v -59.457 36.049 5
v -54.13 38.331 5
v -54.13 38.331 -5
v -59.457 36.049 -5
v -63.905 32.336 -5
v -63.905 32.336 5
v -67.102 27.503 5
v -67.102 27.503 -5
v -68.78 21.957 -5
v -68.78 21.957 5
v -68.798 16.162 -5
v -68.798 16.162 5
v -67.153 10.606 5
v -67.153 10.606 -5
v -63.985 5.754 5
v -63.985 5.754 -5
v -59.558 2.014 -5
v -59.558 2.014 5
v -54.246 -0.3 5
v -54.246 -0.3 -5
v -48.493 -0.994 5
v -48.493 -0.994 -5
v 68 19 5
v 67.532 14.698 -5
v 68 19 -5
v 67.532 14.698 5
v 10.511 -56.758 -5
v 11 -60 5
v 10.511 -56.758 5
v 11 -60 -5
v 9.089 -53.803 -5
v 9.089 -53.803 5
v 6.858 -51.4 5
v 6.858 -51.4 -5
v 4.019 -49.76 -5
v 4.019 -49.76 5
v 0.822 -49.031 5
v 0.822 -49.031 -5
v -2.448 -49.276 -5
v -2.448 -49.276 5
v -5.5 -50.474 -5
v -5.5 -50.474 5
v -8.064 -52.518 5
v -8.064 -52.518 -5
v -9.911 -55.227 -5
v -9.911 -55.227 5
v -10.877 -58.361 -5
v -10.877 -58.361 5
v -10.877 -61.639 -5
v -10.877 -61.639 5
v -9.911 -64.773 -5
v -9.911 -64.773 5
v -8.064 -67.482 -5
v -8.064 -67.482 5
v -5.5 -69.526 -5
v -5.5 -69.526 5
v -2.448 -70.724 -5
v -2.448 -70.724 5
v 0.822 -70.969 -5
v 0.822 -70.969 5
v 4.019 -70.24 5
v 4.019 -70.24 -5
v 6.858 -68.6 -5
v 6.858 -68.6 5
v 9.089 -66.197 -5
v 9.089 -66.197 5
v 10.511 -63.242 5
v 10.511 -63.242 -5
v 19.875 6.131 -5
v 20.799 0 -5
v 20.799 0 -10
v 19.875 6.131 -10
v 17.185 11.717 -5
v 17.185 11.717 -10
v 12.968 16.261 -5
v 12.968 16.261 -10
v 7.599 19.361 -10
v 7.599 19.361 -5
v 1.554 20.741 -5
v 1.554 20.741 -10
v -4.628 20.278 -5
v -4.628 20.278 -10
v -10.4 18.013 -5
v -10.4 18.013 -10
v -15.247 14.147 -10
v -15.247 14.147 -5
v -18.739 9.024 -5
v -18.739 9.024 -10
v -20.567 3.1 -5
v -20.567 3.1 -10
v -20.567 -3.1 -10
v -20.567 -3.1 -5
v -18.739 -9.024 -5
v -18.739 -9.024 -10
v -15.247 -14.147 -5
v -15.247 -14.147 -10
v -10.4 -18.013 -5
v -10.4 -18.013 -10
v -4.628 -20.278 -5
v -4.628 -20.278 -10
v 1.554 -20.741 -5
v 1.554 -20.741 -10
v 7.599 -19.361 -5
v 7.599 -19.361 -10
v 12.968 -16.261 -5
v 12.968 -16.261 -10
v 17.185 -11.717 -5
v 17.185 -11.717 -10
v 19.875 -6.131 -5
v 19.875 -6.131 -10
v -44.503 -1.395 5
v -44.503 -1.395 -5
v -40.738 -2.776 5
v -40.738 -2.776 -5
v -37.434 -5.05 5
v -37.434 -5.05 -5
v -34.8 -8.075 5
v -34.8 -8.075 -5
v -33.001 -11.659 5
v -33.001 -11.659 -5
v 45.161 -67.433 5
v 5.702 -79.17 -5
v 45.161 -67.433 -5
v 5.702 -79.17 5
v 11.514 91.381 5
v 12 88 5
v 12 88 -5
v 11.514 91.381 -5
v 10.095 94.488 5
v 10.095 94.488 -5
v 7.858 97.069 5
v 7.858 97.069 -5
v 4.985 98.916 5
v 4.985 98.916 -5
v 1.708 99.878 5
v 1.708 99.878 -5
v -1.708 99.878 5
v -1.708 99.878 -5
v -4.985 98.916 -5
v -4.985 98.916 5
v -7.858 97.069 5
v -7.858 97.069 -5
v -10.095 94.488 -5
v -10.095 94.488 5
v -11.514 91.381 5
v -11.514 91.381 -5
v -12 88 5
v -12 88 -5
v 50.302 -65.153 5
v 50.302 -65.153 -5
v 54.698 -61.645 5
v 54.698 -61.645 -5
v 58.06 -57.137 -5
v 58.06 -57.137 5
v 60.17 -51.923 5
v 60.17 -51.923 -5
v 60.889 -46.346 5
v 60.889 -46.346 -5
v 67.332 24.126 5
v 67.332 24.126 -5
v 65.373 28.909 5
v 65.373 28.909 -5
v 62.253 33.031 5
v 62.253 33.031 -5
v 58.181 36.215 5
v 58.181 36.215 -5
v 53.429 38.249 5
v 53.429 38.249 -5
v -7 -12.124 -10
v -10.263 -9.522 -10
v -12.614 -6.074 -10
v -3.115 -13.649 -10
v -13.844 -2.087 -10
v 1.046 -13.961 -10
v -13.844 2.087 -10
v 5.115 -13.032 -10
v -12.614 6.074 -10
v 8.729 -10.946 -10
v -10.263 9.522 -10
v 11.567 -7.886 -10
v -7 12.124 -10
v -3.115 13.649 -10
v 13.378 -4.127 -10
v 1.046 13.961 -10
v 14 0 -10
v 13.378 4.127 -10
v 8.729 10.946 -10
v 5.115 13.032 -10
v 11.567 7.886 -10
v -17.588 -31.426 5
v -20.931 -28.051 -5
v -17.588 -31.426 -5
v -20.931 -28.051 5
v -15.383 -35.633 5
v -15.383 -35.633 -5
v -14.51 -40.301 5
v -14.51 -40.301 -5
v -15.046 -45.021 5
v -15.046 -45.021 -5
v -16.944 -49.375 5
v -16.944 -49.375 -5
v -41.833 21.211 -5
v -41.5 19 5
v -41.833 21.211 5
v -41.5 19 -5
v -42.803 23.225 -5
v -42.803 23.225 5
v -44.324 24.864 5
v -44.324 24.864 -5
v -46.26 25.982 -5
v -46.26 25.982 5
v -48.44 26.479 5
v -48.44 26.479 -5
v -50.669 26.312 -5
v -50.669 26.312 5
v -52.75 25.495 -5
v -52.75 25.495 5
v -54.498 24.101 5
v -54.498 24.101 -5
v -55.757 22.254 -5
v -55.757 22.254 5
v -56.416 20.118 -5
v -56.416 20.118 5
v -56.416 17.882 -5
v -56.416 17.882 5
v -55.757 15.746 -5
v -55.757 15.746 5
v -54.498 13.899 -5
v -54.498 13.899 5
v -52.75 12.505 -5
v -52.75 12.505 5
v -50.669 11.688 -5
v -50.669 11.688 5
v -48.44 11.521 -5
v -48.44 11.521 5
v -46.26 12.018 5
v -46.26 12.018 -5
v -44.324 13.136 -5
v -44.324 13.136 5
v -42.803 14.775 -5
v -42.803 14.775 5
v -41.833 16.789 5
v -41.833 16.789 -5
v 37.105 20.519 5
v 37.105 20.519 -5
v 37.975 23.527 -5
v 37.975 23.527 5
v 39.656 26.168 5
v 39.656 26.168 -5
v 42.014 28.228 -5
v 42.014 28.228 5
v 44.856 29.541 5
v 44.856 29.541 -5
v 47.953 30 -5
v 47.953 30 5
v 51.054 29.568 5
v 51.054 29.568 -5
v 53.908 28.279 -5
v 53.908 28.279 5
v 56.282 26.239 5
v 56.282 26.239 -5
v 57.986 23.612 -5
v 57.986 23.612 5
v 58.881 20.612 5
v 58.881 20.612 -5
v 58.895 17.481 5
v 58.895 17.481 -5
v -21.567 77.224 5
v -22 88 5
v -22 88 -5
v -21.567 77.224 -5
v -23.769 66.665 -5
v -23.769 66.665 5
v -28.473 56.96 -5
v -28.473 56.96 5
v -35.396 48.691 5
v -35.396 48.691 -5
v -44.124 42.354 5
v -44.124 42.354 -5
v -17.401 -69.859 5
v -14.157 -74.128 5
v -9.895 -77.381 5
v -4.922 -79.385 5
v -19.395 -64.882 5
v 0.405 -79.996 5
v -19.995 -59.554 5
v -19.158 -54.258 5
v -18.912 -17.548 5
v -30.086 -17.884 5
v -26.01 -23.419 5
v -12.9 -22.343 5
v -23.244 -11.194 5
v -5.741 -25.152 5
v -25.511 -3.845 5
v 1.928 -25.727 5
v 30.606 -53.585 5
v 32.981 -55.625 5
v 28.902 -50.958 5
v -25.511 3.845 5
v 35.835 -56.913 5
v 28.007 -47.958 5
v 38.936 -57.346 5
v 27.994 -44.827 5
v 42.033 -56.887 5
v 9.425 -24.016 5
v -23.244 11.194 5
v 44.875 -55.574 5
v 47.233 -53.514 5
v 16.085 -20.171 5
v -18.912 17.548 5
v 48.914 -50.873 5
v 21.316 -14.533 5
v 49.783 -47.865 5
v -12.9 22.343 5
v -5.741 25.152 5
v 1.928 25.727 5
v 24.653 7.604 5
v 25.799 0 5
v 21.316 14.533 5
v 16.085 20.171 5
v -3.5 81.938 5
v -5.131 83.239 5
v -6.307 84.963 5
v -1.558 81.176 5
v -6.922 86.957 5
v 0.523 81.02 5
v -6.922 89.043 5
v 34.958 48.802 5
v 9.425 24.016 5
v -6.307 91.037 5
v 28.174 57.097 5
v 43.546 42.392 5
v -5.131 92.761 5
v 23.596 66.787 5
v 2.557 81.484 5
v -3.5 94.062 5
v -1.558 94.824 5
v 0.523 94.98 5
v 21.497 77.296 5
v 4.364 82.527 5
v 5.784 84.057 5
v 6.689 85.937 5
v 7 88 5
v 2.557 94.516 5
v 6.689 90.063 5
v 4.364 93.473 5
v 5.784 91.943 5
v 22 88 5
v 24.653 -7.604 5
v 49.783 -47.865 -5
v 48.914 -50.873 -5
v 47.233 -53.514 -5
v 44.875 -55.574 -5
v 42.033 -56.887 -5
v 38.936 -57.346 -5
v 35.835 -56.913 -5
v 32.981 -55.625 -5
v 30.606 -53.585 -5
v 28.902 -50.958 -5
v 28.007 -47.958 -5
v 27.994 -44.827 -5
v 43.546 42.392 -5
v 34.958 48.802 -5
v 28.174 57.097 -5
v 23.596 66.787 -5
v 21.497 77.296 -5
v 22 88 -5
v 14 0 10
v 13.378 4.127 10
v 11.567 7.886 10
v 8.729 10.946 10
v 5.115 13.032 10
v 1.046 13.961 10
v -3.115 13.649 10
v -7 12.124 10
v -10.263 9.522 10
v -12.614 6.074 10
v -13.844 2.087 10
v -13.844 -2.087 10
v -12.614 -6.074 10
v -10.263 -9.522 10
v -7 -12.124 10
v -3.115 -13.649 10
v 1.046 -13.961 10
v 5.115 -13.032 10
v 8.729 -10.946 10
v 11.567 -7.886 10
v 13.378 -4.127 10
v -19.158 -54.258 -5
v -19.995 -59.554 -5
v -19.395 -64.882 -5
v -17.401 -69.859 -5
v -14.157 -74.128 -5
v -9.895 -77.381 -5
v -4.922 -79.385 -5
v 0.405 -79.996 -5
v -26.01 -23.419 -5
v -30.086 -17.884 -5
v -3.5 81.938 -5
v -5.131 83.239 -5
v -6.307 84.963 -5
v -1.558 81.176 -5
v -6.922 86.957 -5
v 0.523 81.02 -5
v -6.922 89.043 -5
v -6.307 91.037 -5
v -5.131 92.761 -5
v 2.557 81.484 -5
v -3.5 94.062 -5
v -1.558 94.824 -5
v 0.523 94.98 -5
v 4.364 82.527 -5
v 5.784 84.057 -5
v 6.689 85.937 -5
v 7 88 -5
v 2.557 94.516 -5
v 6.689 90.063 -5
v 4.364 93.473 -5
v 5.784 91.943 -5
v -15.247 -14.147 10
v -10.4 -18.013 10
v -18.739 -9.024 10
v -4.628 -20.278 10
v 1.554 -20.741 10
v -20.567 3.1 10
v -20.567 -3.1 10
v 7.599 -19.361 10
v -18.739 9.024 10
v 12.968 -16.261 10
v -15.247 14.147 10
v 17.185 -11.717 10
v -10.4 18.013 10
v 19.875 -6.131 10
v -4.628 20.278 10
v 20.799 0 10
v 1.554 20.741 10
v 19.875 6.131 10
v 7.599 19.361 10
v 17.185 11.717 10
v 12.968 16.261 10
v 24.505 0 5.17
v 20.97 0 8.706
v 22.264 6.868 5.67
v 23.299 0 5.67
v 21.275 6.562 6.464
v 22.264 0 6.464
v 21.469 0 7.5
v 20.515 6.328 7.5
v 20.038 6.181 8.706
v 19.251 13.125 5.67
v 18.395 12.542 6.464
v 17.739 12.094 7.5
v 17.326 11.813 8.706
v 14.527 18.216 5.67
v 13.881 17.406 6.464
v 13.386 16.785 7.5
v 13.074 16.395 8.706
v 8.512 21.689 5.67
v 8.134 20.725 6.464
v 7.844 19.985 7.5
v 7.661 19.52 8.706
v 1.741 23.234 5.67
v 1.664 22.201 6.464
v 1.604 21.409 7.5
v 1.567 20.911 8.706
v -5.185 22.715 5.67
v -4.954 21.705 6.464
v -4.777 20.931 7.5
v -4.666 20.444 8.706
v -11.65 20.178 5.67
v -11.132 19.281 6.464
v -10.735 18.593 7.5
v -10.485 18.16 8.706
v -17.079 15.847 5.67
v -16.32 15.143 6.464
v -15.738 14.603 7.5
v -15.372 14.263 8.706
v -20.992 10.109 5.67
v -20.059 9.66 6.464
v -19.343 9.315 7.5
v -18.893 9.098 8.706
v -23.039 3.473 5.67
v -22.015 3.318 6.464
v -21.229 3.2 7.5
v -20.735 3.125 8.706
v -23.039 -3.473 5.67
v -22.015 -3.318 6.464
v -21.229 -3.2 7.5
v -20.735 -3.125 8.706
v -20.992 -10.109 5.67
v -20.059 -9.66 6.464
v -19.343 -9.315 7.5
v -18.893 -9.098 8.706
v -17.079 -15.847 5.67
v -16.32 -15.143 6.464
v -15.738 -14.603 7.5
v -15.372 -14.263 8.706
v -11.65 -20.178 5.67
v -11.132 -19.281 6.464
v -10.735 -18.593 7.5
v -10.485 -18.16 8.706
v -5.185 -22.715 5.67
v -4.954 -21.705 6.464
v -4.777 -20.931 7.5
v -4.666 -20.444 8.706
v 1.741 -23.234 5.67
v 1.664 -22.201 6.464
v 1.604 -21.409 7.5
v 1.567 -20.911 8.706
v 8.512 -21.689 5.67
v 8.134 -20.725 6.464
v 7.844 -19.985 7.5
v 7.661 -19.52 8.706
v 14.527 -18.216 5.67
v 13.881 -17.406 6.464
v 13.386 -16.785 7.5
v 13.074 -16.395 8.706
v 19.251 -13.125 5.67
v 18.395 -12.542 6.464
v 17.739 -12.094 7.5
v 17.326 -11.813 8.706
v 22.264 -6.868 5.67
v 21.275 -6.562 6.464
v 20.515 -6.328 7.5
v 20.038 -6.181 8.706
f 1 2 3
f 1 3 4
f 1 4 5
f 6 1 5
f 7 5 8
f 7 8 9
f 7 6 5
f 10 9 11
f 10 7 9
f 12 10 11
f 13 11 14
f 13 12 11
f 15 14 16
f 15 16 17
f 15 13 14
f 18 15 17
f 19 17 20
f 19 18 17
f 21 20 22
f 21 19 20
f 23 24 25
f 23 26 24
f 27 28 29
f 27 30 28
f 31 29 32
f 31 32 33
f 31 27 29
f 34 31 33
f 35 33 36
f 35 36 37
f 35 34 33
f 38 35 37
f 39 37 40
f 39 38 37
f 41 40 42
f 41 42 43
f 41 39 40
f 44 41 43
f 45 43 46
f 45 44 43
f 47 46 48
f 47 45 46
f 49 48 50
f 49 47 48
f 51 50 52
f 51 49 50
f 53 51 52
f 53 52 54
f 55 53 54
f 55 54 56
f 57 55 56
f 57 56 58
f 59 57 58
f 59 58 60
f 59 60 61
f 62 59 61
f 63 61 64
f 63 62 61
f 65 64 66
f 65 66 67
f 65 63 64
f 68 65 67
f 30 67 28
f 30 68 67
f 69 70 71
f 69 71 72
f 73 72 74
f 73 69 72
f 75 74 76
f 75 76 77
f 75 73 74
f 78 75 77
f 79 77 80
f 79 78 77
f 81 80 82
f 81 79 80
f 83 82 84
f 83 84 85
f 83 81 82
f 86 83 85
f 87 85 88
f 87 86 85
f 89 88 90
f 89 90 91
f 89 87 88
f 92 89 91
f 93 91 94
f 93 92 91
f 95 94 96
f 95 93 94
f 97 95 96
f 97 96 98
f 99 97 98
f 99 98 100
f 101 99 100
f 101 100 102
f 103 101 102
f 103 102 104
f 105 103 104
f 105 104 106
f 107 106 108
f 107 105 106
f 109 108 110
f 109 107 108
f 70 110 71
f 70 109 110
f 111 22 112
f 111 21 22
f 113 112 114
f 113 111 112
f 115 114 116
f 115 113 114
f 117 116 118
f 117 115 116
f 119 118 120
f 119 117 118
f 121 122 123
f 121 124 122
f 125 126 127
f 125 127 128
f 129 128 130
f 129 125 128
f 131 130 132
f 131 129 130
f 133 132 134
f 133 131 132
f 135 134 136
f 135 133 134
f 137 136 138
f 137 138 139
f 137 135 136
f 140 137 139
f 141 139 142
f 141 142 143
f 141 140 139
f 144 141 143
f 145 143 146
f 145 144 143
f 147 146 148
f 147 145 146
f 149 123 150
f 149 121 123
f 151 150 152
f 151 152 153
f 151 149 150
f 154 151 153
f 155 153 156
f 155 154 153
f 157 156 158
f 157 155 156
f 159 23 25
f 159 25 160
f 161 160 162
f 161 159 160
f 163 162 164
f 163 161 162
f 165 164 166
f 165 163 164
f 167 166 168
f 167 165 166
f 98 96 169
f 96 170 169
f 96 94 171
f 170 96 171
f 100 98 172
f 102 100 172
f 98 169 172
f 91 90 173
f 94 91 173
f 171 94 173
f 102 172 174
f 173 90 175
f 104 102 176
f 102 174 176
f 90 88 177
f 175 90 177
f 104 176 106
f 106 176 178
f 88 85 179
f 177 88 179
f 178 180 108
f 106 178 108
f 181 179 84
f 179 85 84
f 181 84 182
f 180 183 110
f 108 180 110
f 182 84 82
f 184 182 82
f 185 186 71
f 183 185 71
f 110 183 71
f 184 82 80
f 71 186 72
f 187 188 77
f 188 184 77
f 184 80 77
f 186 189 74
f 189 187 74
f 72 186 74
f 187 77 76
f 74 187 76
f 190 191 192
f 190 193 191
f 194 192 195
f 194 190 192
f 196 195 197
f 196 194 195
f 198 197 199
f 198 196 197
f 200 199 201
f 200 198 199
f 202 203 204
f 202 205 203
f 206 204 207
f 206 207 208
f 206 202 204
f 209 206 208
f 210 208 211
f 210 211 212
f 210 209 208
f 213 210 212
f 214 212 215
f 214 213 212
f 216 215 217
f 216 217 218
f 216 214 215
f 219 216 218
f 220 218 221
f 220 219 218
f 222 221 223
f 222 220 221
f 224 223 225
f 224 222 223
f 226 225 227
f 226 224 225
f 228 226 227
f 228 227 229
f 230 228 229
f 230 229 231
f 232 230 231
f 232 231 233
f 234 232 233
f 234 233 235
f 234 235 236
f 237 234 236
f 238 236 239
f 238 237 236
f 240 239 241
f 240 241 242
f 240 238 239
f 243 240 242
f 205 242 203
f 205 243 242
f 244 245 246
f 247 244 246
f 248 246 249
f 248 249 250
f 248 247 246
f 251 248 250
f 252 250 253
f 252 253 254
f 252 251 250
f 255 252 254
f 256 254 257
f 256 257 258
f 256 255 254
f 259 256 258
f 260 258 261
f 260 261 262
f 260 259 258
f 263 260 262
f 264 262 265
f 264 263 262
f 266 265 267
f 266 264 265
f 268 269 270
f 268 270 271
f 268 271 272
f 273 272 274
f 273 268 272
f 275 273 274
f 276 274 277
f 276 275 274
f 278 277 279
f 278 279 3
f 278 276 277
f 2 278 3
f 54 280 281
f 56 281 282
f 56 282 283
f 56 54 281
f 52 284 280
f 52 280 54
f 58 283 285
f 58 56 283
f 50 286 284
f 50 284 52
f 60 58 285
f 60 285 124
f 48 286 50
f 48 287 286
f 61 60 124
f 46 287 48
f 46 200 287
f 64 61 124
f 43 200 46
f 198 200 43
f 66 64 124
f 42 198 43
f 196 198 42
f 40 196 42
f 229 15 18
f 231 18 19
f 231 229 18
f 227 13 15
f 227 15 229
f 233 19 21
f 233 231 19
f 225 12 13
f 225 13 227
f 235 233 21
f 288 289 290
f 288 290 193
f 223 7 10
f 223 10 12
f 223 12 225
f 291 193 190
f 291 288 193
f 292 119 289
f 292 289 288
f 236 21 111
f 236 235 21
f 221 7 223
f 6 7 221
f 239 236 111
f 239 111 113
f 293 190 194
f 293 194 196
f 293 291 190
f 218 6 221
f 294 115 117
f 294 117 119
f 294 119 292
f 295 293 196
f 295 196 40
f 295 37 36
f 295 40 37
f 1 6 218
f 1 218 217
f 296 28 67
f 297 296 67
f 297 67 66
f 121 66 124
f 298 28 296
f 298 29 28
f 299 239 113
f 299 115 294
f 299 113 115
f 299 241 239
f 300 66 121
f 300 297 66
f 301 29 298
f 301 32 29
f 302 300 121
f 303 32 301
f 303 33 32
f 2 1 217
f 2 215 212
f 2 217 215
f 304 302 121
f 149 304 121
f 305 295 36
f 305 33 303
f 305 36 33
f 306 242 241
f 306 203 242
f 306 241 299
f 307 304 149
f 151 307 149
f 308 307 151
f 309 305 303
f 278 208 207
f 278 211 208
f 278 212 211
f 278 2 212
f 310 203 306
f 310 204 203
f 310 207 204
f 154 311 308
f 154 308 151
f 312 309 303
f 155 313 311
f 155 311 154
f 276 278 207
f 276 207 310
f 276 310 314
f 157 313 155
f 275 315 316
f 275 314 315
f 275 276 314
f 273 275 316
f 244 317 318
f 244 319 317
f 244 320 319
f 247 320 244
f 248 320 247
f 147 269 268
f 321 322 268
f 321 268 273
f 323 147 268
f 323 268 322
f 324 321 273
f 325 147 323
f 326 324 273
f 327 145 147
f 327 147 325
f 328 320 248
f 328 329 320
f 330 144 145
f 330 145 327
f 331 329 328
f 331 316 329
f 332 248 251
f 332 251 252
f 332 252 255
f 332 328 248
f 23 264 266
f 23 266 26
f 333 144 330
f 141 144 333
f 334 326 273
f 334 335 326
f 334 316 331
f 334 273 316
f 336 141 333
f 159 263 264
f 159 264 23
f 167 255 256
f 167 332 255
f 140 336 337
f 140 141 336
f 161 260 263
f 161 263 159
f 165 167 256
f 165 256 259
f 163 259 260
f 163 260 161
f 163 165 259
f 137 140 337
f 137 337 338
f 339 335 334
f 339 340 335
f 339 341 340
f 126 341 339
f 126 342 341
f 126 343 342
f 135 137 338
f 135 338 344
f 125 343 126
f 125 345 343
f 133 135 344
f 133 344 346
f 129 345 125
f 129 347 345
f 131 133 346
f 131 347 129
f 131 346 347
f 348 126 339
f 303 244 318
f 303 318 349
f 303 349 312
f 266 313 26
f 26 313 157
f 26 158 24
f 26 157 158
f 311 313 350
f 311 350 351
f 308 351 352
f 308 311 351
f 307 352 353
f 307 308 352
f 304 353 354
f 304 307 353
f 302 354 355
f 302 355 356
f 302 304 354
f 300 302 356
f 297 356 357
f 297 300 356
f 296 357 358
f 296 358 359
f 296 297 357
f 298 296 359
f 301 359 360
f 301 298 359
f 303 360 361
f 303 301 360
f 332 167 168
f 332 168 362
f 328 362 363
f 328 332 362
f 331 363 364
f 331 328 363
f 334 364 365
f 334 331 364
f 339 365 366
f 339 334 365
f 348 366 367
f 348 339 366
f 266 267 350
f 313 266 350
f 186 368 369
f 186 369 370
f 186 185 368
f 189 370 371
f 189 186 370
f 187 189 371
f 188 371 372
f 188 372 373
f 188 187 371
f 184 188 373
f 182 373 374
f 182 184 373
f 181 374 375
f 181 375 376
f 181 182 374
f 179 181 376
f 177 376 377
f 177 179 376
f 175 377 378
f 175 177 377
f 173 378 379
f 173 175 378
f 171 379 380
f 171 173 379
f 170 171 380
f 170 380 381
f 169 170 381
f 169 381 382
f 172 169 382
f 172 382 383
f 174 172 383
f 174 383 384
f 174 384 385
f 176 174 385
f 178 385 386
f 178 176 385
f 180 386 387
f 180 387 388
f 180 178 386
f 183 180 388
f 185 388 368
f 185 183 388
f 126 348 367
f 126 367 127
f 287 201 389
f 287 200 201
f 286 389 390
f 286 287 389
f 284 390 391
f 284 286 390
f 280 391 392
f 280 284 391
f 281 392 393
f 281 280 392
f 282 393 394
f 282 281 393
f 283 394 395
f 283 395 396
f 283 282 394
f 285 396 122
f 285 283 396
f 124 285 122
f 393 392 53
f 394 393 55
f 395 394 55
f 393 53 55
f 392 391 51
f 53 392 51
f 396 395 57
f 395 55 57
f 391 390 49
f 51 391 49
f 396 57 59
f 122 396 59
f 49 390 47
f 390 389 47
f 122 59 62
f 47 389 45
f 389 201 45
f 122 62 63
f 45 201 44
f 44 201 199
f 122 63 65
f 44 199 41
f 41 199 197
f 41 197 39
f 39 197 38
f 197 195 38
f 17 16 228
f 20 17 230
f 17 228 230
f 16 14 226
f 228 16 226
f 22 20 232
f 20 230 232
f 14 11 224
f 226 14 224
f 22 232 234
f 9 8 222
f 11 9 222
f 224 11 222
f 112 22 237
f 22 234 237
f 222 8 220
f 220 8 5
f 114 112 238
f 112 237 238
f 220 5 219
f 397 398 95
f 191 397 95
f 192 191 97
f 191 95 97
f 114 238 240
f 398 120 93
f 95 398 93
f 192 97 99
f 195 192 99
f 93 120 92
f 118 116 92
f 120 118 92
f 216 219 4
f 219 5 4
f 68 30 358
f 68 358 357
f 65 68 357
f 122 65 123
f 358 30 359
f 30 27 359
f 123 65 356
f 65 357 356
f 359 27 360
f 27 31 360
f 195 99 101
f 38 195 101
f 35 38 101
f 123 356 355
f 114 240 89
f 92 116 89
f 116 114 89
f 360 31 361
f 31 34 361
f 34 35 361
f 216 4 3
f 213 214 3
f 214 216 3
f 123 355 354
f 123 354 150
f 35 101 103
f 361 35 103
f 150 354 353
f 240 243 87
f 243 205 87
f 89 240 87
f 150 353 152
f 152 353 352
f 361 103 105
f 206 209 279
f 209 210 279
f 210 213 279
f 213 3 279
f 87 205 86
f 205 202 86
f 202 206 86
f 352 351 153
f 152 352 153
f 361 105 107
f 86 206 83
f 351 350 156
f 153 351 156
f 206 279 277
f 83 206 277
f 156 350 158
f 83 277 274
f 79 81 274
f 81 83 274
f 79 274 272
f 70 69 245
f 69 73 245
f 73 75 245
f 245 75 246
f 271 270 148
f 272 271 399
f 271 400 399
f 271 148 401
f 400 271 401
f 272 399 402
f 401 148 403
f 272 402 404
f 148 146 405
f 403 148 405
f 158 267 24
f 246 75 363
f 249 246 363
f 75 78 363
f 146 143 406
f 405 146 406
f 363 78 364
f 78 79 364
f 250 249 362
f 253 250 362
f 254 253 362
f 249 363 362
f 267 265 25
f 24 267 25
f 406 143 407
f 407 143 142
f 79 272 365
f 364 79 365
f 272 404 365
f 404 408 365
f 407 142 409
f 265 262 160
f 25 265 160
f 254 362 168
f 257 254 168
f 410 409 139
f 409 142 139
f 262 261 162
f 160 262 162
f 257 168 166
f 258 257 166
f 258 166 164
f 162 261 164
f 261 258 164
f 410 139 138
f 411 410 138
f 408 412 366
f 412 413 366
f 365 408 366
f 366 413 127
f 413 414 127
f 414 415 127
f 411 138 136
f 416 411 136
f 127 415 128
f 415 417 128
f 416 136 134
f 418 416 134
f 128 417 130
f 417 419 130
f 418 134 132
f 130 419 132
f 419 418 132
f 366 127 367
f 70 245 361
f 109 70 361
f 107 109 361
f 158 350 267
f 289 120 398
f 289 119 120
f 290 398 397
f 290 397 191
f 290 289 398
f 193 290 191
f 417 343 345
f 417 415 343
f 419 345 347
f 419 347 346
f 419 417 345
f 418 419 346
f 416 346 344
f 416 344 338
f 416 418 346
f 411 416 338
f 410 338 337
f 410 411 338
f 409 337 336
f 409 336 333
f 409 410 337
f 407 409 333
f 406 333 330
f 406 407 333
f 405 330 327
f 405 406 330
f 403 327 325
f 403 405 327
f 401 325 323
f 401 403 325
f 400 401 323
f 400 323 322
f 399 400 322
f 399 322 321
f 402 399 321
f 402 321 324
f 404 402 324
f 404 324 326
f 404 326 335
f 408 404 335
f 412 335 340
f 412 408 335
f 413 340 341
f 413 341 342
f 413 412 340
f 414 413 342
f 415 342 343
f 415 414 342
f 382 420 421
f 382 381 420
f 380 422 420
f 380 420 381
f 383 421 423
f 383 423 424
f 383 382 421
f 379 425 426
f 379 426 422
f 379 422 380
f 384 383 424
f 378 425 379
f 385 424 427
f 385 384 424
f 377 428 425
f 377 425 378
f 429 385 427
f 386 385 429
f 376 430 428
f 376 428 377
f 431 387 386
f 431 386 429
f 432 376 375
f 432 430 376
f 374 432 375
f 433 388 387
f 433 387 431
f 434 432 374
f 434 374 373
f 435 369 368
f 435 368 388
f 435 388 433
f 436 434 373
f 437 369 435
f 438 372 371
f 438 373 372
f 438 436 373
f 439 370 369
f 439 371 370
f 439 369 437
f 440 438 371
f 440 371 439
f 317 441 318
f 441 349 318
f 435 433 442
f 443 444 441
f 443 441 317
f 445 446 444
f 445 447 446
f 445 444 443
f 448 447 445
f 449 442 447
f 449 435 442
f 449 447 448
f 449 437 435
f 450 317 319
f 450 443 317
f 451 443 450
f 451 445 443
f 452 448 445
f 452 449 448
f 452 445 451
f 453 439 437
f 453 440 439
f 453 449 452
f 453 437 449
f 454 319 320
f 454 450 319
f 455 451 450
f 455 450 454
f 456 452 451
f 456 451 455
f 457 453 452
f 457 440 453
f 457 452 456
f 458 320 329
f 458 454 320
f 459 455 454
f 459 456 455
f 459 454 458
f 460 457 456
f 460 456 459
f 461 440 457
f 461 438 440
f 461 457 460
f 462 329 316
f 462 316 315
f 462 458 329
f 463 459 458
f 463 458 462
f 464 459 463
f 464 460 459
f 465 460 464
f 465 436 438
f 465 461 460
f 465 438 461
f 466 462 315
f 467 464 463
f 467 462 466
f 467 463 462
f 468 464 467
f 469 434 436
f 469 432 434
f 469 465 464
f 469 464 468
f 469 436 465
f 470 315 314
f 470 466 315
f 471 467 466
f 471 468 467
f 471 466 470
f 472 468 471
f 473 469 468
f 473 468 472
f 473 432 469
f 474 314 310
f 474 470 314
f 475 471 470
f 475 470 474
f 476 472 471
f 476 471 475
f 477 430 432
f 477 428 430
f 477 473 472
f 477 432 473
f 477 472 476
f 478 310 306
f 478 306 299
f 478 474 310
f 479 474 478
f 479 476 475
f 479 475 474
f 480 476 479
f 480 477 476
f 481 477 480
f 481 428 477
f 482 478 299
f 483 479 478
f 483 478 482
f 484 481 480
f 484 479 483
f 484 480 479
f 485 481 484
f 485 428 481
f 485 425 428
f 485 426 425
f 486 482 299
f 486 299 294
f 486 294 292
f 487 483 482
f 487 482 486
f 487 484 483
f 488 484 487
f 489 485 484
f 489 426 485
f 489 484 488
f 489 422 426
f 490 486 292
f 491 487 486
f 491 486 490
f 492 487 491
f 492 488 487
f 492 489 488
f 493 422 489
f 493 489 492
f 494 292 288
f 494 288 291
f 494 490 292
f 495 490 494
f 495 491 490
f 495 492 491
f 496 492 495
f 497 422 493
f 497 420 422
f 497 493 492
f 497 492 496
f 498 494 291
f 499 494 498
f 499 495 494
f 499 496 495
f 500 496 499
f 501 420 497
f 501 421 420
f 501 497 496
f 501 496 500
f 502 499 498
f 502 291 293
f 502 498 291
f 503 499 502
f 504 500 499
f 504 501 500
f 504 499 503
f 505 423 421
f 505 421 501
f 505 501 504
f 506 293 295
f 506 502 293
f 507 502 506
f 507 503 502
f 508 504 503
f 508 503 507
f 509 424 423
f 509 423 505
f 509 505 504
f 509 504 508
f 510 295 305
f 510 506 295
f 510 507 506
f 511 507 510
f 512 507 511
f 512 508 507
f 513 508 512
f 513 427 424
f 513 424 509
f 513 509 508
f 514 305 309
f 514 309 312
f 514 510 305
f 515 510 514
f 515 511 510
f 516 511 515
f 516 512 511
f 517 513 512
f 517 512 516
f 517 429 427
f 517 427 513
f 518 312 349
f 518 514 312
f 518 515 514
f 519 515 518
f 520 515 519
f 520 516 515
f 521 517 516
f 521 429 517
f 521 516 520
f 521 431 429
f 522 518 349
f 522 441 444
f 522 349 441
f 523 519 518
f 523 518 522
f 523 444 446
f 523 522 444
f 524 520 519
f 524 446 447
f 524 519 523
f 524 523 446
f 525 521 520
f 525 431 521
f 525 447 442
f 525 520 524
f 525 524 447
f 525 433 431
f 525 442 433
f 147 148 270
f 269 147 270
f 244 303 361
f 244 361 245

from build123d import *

# Parameters (mm, degrees)
SKETCH1_R           = 20.799200533
SKETCH1_R_2         = 14
BOSS_EXTRUDE2_DEPTH = 10
SKETCH1_5_R         = 11
SKETCH1_5_R_2       = 20.799200533
SKETCH1_5_R_3       = 7.5
SKETCH1_5_R_4       = 7
BOSS_EXTRUDE3_DEPTH = 5
FILLET1_R           = 5


with BuildPart() as part:
    # Sketch1 → Boss-Extrude2 (new, symmetric)
    with BuildSketch(Plane.XY):
        Circle(SKETCH1_R)
        Circle(SKETCH1_R_2, mode=Mode.SUBTRACT)
    extrude(amount=BOSS_EXTRUDE2_DEPTH, both=True)

    # Sketch1<5> → Boss-Extrude3 (add, symmetric)
    with BuildSketch(Plane.XY):
        with BuildLine():
            Line((67.531815598, 14.697886629), (68, 19))
            ThreePointArc((68, 19), (63.946467856, 31.071046472), (53.428983707, 38.249055455))
            ThreePointArc((53.428983707, 38.249055455), (28.173712308, 57.097365678), (22, 88))
            Line((22, 88), (12, 88))
            ThreePointArc((12, 88), (0, 100), (-12, 88))
            Line((-12, 88), (-22, 88))
            ThreePointArc((-22, 88), (-28.472570597, 56.960167242), (-54.130188439, 38.330834606))
            ThreePointArc((-54.130188439, 38.330834606), (-68.797617118, 16.161980188), (-48.492972379, -0.993572042))
            ThreePointArc((-48.492972379, -0.993572042), (-39.014510451, -3.809523143), (-33.001122743, -11.658726248))
            ThreePointArc((-33.001122743, -11.658726248), (-28.18429152, -20.752004999), (-20.931196761, -28.051470588))
            ThreePointArc((-20.931196761, -28.051470588), (-14.77228566, -37.934411824), (-16.94430214, -49.375))
            ThreePointArc((-16.94430214, -49.375), (-15.922624494, -72.102480293), (5.70222012, -79.169890081))
            Line((5.70222012, -79.169890081), (45.161092518, -67.432567897))
            ThreePointArc((45.161092518, -67.432567897), (56.523753546, -59.49875448), (60.888650386, -46.345688809))
            Line((60.888650386, -46.345688809), (67.531815598, 14.697886629))
        make_face()
        with Locations((0, -60)):
            Circle(SKETCH1_5_R, mode=Mode.SUBTRACT)
        Circle(SKETCH1_5_R_2, mode=Mode.SUBTRACT)
        with BuildLine():
            ThreePointArc((37.105394377, 20.519068244), (49.519068244, 29.894605623), (58.894605623, 17.480931756))
            Line((58.894605623, 17.480931756), (49.783256009, -47.864757052))
            ThreePointArc((49.783256009, -47.864757052), (37.369582142, -57.240294431), (27.994044763, -44.826620565))
            Line((27.994044763, -44.826620565), (37.105394377, 20.519068244))
        make_face(mode=Mode.SUBTRACT)
        with Locations((-49, 19)):
            Circle(SKETCH1_5_R_3, mode=Mode.SUBTRACT)
        with Locations((0, 88)):
            Circle(SKETCH1_5_R_4, mode=Mode.SUBTRACT)
    extrude(amount=BOSS_EXTRUDE3_DEPTH, both=True)

    # Fillet1
    fillet1_edges = [part.edges().sort_by_distance(p)[0] for p in [
        (-20.799200533, 0, 5),
    ]]
    fillet(fillet1_edges, radius=FILLET1_R - 0.0001)  # a hair under: the kernel refuses the full size


solid = part.part
